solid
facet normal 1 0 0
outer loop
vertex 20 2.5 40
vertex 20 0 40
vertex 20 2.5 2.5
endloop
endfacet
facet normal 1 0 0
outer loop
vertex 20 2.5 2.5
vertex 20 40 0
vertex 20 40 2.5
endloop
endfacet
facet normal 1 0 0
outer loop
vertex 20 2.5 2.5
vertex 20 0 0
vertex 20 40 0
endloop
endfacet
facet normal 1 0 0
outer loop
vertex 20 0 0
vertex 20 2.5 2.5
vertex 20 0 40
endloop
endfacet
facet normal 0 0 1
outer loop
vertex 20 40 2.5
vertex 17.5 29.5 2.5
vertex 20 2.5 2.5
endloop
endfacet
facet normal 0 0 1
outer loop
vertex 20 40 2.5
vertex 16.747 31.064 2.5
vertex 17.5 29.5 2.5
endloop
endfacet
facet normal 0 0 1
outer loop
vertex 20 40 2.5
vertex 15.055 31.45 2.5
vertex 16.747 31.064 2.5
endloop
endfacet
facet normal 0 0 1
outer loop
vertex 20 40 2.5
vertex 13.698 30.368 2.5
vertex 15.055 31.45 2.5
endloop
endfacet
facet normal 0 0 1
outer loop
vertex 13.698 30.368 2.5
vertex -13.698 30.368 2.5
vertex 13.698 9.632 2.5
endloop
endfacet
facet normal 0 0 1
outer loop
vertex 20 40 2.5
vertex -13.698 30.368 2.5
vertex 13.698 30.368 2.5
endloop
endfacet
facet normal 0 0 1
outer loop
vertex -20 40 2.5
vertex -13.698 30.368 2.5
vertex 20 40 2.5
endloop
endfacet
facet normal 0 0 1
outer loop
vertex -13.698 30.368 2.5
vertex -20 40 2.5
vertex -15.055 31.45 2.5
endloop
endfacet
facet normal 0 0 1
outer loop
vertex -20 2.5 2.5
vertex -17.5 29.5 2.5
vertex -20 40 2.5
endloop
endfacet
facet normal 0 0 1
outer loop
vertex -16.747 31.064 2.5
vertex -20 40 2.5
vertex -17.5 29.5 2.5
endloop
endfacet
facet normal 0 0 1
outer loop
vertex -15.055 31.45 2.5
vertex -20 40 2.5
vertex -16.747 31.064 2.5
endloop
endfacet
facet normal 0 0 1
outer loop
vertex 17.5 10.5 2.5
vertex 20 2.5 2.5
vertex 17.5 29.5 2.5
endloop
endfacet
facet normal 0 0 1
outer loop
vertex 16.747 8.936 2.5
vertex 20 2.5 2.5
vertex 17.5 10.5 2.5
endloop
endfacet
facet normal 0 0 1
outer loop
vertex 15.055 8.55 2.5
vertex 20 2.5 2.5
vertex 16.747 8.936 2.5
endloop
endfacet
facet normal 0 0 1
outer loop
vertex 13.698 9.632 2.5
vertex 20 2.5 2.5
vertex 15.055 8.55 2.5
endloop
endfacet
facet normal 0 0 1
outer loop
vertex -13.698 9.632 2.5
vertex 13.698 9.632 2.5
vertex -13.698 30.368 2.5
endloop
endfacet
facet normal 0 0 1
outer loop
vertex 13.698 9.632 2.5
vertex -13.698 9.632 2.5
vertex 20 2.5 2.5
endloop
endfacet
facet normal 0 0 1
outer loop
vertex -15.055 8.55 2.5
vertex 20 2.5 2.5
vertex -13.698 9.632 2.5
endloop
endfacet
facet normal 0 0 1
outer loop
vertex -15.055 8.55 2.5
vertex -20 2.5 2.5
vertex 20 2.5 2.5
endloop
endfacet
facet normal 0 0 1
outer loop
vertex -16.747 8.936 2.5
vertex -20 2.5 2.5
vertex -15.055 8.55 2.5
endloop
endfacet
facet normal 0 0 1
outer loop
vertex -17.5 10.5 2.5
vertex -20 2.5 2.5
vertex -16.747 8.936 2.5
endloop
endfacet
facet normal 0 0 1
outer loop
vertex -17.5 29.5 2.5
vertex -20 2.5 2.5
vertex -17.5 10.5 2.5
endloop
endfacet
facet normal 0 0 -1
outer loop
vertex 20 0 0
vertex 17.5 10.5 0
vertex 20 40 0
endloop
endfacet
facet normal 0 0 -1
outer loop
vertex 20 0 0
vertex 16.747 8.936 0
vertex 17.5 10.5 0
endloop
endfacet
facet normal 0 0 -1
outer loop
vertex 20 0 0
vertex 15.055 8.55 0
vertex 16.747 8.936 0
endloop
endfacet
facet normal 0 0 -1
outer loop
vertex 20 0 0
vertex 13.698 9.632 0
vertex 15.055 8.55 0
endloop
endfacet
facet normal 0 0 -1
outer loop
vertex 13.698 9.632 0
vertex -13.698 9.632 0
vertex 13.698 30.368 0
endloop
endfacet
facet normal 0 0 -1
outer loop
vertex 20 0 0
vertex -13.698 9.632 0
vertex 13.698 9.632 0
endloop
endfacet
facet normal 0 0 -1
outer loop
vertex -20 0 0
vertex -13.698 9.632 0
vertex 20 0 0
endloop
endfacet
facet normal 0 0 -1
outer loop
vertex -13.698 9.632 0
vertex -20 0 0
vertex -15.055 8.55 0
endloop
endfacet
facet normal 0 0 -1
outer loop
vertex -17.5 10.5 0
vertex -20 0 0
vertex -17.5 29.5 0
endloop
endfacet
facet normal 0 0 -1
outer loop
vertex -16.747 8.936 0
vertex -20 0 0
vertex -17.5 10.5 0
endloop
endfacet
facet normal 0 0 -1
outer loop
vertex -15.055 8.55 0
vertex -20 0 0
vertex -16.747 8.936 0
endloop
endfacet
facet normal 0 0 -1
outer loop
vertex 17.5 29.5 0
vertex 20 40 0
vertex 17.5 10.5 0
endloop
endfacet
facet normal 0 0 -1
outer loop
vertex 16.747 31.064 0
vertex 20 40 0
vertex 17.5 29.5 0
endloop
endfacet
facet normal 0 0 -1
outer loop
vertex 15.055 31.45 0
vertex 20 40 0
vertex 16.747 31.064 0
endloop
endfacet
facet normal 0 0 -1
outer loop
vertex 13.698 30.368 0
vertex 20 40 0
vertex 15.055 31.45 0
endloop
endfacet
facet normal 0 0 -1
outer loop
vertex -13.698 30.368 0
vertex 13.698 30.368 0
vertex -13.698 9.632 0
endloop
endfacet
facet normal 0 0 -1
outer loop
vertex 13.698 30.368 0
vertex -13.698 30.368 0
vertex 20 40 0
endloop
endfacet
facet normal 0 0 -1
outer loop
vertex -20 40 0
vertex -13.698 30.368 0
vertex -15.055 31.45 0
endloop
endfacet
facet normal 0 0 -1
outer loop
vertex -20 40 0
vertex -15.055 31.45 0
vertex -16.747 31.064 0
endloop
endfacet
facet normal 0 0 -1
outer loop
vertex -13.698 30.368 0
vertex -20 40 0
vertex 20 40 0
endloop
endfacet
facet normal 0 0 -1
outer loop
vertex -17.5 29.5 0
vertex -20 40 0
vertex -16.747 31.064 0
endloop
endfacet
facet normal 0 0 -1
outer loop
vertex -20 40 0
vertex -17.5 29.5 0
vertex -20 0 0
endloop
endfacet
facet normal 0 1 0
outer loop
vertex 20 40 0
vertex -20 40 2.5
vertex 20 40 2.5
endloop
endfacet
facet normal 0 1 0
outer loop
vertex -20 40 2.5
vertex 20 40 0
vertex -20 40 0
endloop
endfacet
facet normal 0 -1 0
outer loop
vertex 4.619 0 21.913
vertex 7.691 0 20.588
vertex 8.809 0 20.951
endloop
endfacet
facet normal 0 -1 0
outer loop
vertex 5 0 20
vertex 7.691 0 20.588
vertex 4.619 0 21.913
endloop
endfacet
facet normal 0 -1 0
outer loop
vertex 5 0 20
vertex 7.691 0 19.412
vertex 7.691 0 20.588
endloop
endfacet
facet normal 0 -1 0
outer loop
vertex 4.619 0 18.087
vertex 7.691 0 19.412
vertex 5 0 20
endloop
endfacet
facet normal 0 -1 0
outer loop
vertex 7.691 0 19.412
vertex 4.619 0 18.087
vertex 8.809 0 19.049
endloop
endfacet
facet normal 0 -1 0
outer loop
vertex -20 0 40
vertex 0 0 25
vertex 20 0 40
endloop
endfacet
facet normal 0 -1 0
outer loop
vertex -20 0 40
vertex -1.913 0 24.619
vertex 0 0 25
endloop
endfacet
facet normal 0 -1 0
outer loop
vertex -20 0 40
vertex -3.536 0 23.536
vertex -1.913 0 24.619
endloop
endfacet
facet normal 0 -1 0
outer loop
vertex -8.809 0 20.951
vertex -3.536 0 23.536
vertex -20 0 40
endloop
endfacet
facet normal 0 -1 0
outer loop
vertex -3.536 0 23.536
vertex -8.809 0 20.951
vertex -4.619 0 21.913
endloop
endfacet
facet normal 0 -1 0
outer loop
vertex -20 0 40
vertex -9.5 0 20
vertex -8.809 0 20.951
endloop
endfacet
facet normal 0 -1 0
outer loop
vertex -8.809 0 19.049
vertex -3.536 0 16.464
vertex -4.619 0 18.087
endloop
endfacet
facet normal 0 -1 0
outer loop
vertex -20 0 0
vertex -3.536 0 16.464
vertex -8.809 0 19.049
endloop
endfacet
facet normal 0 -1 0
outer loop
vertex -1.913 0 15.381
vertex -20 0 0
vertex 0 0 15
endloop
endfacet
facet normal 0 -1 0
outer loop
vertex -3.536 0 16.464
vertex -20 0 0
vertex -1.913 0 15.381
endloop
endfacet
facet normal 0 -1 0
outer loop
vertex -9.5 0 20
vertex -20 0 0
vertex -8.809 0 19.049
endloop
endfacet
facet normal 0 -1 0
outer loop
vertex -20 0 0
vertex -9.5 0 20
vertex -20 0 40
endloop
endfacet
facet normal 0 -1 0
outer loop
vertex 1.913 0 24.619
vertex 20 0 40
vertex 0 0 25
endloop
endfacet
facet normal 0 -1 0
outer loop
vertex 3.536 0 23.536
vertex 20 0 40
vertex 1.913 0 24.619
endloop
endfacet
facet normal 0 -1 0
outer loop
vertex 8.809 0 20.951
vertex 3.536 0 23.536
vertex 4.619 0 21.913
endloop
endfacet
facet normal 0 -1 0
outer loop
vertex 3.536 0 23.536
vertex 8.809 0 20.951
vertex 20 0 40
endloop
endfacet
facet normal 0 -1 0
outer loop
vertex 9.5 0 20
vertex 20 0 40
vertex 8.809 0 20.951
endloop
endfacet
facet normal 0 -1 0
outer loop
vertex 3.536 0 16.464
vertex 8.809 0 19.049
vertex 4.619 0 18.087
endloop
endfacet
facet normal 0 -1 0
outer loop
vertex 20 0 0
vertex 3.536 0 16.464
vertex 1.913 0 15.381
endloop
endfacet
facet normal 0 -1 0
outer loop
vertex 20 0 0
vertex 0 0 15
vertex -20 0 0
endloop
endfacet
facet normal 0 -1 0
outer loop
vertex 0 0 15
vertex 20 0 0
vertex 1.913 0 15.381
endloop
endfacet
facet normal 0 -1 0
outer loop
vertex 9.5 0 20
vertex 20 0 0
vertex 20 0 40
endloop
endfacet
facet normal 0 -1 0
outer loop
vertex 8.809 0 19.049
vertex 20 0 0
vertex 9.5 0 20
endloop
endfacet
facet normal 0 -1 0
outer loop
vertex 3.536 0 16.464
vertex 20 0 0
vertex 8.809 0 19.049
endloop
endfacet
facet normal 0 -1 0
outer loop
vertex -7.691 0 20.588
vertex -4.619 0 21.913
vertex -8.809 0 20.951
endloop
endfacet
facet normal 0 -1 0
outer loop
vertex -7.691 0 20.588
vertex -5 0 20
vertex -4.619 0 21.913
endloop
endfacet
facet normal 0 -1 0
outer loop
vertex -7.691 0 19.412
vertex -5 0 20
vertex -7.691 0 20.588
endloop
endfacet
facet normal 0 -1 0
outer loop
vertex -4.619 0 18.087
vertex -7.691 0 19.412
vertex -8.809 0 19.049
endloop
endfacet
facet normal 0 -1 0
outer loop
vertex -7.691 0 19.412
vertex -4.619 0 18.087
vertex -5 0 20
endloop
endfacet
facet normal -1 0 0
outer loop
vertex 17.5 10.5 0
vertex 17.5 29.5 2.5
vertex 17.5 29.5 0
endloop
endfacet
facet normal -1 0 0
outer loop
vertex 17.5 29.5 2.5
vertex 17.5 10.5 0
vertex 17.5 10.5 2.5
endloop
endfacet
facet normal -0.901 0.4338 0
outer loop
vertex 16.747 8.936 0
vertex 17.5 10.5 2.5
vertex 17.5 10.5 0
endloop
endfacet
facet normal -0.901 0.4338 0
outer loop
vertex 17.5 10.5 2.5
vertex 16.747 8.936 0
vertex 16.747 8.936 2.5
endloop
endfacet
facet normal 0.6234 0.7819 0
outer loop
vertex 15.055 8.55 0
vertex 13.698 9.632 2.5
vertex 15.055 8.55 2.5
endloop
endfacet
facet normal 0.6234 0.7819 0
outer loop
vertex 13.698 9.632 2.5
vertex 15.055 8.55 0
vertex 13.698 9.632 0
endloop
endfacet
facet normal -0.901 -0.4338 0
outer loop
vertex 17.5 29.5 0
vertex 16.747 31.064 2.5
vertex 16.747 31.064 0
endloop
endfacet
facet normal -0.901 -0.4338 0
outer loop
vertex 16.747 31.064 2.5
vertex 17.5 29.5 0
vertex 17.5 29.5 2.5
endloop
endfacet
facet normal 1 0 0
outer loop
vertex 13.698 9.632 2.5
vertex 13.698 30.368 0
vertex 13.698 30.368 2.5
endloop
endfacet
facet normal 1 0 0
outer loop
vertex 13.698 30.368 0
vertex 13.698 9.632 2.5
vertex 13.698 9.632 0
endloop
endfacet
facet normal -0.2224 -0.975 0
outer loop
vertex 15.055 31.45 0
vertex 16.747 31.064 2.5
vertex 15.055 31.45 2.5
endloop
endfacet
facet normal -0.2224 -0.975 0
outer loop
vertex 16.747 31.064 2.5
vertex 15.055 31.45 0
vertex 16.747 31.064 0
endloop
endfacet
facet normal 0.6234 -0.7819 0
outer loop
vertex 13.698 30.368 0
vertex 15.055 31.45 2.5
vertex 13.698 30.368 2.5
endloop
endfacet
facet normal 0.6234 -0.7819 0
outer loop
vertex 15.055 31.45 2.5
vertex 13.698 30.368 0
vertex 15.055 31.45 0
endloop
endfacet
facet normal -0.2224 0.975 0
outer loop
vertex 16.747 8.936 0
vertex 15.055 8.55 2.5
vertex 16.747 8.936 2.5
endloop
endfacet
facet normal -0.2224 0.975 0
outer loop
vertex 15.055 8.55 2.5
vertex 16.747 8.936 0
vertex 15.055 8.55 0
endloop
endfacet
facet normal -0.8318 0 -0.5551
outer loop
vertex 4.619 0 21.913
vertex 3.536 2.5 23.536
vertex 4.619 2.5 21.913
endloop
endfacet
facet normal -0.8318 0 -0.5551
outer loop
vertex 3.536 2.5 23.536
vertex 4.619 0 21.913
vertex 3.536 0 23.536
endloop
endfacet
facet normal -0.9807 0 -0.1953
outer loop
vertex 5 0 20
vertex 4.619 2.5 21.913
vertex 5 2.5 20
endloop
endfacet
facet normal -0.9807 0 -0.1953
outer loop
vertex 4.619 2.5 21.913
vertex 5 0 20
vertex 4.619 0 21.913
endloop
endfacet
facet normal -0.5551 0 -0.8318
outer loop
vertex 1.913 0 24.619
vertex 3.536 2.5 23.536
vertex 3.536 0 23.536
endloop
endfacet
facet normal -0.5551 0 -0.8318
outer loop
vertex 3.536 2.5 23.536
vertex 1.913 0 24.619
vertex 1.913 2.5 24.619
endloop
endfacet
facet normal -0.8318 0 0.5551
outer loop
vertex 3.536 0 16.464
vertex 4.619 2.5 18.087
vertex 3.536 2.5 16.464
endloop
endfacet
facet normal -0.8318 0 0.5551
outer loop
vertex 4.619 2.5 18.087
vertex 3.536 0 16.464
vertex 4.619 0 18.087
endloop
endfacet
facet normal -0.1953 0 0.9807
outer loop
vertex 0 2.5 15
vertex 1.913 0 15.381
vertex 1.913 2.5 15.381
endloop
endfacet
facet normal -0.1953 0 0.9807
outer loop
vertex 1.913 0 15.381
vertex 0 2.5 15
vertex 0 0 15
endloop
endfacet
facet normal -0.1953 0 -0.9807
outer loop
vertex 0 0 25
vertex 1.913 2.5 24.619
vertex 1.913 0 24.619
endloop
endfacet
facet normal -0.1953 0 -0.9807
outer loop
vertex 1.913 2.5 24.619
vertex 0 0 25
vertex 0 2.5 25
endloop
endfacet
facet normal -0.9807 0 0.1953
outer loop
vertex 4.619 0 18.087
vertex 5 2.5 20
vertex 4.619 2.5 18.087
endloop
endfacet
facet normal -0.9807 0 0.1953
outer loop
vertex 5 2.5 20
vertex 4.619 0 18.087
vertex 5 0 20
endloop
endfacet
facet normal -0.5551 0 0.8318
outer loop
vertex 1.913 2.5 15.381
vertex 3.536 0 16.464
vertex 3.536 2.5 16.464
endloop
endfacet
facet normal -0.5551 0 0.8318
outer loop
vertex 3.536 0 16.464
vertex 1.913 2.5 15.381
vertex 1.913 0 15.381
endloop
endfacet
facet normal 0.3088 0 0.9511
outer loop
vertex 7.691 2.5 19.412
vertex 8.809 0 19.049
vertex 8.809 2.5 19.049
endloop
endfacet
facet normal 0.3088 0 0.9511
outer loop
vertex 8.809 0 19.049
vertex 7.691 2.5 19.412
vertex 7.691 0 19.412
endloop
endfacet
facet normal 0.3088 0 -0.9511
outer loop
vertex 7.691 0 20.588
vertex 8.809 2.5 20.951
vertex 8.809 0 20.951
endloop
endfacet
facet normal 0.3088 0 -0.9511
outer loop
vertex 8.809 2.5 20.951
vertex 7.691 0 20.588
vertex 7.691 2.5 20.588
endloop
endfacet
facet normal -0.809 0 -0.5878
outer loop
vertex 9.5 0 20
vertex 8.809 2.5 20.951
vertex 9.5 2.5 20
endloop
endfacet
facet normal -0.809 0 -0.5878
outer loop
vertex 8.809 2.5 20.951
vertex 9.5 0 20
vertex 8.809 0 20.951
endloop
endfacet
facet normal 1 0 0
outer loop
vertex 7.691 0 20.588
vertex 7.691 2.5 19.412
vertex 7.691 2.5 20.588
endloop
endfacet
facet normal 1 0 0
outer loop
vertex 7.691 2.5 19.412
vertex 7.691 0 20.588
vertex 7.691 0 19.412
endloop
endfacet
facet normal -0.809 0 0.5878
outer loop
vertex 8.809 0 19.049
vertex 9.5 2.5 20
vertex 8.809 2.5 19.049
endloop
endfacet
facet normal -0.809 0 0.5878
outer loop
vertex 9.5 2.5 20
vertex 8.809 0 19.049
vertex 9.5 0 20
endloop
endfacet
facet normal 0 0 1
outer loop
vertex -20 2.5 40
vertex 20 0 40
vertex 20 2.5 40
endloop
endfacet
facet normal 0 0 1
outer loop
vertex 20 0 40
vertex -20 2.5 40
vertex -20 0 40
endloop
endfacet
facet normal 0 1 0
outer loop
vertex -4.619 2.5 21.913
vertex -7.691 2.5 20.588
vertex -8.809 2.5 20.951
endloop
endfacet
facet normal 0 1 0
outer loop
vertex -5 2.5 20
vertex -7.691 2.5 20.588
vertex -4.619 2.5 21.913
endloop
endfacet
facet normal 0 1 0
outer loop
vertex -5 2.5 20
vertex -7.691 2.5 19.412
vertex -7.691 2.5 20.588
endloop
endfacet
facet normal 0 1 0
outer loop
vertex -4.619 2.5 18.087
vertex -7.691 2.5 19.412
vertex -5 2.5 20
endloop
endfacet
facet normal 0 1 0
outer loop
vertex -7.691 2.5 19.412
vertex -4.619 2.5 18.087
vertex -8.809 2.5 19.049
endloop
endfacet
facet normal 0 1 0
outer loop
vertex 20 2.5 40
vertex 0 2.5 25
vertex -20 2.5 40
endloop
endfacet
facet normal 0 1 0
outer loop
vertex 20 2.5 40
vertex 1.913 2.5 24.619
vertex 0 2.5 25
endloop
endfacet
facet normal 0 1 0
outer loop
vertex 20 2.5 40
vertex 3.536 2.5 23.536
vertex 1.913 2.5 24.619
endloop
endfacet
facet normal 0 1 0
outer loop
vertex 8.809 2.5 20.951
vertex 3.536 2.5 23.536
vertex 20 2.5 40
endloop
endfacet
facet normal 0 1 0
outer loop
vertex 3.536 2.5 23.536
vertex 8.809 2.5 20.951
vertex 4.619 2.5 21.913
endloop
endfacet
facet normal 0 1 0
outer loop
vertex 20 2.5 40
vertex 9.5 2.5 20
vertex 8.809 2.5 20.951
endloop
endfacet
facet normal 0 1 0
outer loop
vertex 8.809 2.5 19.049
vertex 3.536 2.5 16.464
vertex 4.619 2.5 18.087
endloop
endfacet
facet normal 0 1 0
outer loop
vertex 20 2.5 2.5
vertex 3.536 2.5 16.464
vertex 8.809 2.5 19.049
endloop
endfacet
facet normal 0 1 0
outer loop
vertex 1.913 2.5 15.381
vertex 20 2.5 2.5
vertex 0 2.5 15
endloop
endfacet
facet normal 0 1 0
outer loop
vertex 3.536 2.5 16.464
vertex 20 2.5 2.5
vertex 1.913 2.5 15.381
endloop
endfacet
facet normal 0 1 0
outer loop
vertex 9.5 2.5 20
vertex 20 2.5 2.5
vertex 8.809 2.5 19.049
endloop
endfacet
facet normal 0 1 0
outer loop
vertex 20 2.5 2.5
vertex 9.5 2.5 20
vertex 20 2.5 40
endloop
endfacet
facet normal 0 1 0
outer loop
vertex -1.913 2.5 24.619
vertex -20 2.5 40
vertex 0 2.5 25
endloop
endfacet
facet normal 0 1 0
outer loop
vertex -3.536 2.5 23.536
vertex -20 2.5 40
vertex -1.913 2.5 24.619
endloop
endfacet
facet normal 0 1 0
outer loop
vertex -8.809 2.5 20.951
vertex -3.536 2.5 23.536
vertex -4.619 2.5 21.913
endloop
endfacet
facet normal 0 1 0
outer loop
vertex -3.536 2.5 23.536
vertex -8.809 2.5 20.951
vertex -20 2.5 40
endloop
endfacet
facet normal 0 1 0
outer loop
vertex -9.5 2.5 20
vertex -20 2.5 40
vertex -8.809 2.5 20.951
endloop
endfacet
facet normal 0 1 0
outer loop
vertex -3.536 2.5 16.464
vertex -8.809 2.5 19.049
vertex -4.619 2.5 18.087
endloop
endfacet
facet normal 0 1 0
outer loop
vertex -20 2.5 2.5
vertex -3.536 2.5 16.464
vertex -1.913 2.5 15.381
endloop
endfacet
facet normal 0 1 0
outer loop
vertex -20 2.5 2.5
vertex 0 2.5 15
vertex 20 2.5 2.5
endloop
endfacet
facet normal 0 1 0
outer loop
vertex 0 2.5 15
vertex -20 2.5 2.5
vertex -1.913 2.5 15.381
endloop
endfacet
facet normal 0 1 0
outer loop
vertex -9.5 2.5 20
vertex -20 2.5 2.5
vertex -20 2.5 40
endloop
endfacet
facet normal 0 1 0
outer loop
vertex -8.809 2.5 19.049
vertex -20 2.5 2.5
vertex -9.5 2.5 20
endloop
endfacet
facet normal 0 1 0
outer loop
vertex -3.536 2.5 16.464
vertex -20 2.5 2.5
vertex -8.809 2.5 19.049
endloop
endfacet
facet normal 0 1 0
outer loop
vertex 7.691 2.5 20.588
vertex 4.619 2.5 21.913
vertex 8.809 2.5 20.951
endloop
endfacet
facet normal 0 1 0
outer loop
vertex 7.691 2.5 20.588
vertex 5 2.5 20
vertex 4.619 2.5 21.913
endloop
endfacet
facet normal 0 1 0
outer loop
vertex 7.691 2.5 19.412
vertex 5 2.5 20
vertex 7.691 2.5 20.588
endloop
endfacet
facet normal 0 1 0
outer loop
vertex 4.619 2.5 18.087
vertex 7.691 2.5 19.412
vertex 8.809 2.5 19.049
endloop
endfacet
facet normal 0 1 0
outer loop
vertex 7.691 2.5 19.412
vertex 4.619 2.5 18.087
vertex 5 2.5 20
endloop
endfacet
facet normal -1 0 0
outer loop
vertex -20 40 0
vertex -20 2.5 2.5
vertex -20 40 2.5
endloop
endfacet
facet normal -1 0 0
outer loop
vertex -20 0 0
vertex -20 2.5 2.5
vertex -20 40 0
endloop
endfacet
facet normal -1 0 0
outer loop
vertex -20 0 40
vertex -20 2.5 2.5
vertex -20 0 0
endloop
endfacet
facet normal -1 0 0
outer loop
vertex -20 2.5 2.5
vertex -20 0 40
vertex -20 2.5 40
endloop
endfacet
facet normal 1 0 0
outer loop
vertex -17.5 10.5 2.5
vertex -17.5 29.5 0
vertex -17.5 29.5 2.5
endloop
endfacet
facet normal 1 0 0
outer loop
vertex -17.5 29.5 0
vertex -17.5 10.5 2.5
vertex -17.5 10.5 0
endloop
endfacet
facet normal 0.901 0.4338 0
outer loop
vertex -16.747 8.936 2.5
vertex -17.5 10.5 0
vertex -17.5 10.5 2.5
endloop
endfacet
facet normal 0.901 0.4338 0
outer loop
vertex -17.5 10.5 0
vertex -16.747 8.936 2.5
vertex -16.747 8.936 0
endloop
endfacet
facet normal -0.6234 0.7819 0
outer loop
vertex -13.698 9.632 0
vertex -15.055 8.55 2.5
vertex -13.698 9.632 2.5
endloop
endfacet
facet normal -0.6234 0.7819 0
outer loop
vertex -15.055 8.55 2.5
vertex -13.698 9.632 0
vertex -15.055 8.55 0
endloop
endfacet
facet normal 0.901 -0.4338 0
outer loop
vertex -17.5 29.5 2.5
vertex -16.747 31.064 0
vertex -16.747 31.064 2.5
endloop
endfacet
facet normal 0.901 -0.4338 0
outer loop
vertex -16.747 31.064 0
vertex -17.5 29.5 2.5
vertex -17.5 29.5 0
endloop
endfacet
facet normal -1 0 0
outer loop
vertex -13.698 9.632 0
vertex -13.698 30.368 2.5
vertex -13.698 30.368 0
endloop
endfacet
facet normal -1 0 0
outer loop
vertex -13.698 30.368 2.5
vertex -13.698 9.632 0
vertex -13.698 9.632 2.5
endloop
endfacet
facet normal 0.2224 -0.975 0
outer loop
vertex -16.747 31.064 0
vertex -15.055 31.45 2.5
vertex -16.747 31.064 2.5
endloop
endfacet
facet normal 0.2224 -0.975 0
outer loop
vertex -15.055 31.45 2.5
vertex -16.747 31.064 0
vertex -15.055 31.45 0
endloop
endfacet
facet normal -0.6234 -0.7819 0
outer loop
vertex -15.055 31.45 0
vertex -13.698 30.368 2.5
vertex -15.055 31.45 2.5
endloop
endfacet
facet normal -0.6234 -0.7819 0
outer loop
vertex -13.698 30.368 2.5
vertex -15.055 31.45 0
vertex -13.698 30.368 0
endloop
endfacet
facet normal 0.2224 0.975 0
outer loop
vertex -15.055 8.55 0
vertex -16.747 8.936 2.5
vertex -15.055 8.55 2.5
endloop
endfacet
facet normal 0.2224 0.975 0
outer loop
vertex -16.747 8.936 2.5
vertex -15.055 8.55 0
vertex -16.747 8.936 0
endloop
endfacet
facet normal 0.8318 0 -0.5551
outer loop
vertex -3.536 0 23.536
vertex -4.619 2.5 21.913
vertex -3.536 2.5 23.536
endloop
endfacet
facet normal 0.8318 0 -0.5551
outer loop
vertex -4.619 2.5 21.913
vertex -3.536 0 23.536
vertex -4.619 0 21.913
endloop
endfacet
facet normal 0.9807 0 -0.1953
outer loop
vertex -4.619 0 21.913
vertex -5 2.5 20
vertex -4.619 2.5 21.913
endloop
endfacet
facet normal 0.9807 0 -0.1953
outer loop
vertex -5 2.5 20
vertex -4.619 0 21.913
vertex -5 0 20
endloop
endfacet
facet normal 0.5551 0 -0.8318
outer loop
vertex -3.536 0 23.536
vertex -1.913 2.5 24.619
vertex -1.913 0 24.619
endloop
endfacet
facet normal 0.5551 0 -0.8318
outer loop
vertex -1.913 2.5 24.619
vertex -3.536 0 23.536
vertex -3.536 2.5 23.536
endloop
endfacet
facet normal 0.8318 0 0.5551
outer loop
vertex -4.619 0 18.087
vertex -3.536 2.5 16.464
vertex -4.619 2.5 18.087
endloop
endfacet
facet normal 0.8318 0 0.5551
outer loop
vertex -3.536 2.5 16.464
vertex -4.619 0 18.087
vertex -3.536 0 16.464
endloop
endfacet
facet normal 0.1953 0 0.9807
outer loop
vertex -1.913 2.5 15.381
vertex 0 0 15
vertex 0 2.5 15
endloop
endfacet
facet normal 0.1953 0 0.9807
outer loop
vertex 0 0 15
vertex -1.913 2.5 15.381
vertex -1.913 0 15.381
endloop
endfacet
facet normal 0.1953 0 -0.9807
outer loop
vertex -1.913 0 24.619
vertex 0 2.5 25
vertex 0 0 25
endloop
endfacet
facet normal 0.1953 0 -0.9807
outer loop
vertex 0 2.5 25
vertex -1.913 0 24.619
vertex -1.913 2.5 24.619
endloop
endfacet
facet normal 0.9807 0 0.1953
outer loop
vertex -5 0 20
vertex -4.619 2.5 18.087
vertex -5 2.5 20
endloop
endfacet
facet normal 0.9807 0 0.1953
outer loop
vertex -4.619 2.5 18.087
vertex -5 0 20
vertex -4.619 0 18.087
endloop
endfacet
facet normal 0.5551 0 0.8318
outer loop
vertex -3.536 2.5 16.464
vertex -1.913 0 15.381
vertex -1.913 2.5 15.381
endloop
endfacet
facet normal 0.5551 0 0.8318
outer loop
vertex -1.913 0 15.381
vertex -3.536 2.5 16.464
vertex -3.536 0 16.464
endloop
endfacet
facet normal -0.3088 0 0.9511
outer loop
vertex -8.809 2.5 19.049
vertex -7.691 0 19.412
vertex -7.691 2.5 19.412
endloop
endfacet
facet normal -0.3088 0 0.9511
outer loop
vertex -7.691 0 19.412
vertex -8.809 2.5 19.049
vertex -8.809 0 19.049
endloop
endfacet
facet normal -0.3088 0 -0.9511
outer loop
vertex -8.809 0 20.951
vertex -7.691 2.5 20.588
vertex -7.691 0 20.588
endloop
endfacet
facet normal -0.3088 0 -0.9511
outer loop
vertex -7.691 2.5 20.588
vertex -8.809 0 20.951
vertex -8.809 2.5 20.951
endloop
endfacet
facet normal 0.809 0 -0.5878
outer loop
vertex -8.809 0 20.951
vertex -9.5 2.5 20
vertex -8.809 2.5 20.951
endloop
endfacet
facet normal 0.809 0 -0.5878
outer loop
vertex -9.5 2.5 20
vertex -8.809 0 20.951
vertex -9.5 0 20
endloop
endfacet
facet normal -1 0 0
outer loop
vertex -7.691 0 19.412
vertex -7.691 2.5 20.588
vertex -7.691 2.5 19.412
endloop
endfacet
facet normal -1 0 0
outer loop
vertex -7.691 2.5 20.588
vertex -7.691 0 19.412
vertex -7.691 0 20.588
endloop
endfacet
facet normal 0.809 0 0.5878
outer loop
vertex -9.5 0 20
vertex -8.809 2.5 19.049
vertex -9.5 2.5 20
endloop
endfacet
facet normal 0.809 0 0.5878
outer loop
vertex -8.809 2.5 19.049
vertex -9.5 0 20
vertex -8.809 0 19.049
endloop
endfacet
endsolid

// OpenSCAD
//Height support
Height_support=40;

//thickness;
Thickness = 2.5;//[1:10]

//Diameter of the center hole motor
Motor_center_hole_diameter=10;

//Diameter of the motor mount holes
Motor_mount_hole_diameter=2;

//Diameter of the holes for fixing the equerre
Motor_mount_hole_spacing=15;

//use renforcement
Renforcement = "yes"; // [yes,no]

//Diameter of the slot holes for fixing the equerre
Base_slot=4;


//ignore variable values
H=Height_support / 1;
E=Thickness / 1; 
D=Motor_center_hole_diameter/1;
d=Motor_mount_hole_diameter/1;
T=Base_slot/1; 
M=Motor_mount_hole_spacing/1; 

module equerre(){
		union(){
			//base
			difference(){
				cube([H/2,H,E]);
				union(){
					//Oblon
			      hull(){ 
			        translate([H/2-(E+T/2),E+T+H/10,-E]) cylinder(r=T/2, h=3*E);
			        translate([H/2-(E+T/2),H-E-T-H/10,-E])cylinder(r=T/2, h=3*E);
					}
				}

			}
if(Renforcement == "yes"){
		translate([H/2-E,E,E]) polyhedron(
			points=[[0,0,0],[E,0,0],[E,0,E],[0,0,E],[0,E,0],[E,E,0]],
			faces=[[0,1,2],[0,2,3],[0,1,5],[0,5,4],[3,2,5],[1,2,5],[5,3,4],[0,4,3]
					]
				);
	}
				 
			//haut
			difference(){
				cube([H/2,E,H]);
				rotate([90,0,0]){
					union(){
						//trou axe moteur
						translate([0,H/2,-2*E])cylinder(r=D/2,h=4*E);
						//trou fixation moteur
						translate([M/2+d/2,H/2,-2*E])cylinder(r=d/2,h=4*E);
					}
				}
			}
		}
}

	union(){
		equerre();
		mirror([1,0,0])equerre();
	}
